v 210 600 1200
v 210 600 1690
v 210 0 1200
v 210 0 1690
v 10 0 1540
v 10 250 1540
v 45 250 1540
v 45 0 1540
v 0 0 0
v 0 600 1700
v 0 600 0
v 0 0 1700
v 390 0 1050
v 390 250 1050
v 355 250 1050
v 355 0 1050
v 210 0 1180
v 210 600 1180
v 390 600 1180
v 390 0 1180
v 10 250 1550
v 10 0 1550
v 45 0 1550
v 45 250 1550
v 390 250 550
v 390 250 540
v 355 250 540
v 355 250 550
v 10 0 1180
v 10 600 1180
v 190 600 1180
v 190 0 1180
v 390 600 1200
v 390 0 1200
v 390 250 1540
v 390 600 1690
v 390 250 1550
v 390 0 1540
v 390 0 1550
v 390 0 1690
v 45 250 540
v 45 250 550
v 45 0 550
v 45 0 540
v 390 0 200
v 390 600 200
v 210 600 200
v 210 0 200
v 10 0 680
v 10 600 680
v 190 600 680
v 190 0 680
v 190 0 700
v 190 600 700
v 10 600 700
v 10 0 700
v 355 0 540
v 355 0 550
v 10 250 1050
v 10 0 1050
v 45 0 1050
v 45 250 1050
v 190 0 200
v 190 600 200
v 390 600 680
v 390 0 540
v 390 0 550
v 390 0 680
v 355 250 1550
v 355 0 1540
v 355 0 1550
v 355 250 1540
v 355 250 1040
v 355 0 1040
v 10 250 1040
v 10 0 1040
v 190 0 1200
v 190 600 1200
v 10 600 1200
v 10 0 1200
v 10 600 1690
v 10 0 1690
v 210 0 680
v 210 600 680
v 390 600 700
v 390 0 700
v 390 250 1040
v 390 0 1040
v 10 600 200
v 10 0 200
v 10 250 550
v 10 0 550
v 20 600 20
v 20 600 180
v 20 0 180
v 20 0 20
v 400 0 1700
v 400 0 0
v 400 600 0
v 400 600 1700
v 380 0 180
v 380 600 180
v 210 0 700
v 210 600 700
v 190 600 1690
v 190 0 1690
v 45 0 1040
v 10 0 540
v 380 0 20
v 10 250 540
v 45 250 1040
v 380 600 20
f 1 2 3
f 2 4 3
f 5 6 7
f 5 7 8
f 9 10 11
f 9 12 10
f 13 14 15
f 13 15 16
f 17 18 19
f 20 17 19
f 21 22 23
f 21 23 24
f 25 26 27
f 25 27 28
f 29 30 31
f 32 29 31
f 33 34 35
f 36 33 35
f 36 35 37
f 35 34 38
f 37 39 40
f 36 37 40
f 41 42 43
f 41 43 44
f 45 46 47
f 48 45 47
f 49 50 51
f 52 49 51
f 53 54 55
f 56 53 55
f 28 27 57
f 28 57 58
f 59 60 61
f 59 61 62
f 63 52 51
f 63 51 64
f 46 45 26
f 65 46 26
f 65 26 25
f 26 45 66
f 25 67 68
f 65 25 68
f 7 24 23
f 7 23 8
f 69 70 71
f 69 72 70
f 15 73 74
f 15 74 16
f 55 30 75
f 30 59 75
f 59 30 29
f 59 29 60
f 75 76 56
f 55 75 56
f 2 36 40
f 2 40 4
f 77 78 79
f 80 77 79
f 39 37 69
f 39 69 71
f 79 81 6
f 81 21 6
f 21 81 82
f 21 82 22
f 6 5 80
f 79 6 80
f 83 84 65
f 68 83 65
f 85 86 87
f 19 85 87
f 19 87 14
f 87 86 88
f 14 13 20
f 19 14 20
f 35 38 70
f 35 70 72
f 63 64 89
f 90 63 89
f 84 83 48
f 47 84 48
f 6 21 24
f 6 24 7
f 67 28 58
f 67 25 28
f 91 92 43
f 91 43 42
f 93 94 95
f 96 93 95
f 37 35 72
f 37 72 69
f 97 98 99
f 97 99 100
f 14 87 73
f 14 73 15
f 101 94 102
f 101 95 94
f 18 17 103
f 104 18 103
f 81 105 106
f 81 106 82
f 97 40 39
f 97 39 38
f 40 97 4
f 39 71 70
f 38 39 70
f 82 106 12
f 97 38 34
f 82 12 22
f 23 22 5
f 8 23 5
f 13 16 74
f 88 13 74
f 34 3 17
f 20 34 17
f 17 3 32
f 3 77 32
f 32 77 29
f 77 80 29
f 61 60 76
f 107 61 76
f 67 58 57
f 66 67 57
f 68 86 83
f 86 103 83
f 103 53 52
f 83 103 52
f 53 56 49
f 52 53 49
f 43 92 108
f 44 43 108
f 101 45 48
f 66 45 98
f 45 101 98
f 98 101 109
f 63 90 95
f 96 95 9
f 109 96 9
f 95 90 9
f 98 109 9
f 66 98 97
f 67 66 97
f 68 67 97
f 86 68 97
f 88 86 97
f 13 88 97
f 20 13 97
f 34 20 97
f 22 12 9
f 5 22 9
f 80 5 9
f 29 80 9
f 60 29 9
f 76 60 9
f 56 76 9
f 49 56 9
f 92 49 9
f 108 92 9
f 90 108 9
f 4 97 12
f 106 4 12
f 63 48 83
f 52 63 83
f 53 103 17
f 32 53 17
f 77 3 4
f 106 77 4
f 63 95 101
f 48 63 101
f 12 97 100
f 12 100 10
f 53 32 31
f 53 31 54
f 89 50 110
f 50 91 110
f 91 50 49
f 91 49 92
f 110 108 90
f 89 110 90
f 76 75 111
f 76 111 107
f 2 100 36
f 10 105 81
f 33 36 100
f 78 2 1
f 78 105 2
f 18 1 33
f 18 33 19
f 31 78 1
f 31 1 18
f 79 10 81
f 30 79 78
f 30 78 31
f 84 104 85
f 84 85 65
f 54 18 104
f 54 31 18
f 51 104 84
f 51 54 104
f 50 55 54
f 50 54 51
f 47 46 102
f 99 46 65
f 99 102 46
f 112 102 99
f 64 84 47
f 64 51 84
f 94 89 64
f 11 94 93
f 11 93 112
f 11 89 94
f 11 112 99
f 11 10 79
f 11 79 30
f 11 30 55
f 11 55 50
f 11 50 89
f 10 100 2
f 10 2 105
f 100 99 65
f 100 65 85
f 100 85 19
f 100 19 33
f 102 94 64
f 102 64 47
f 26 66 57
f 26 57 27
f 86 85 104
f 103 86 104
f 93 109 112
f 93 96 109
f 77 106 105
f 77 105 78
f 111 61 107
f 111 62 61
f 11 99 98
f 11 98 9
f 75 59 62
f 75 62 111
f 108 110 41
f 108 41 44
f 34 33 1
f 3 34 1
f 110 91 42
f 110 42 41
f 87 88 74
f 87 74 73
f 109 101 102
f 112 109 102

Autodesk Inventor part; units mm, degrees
ref_plane "YZ Plane" through (0, 0, 0) normal (1, 0, 0) x (0, 1, 0)
ref_plane "XZ Plane" through (0, 0, 0) normal (0, 1, 0) x (-1, 0, 0)
ref_plane "XY Plane" through (0, 0, 0) normal (0, 0, 1) x (1, 0, 0)
sketch "Sketch2" plane through (0, 0, 0) normal (0, 1, 0) x (-1, 0, 0)
  line L0 (-400, 180) -> (-400, 1700)
  line L1 (-400, 1700) -> (0, 1700)
  line L2 (0, 1700) -> (0, 180)
  line L3 (-400, 200) -> (-400, 600)
  line L4 (0, 600) -> (0, 200)
  line L5 (0, 600) -> (0, 700)
  line L6 (-400, 700) -> (-400, 600)
  line L7 (-400, 700) -> (-400, 1100)
  line L8 (0, 1100) -> (0, 700)
  line L9 (0, 1100) -> (0, 1200)
  line L10 (-400, 1200) -> (-400, 1100)
  line L11 (-400, 1200) -> (-400, 1600)
  line L12 (0, 1600) -> (0, 1200)
  line L13 (0, 200) -> (0, 180)
  line L14 (0, 180) -> (-400, 180)
  line L15 (-400, 180) -> (-400, 200)
  line L16 (0, 700) -> (0, 680)
  line L17 (-400, 680) -> (-400, 700)
  line L18 (0, 1200) -> (0, 1180)
  line L19 (-400, 1180) -> (-400, 1200)
  line L20 (-390, 200) -> (-210, 200)
  line L21 (-190, 200) -> (-10, 200)
  line L22 (-10, 200) -> (-190, 200)
  line L23 (-210, 200) -> (-390, 200)
  line L24 (-210, 680) -> (-210, 200)
  line L25 (-190, 680) -> (-190, 200)
  line L26 (-390, 700) -> (-210, 700)
  line L27 (-190, 700) -> (-10, 700)
  line L28 (-10, 700) -> (-190, 700)
  line L29 (-210, 700) -> (-390, 700)
  line L30 (-10, 700) -> (-190, 700)
  line L31 (-210, 700) -> (-390, 700)
  line L32 (-10, 680) -> (-190, 680)
  line L33 (-210, 680) -> (-390, 680)
  line L34 (-10, 680) -> (-10, 200)
  line L35 (-390, 200) -> (-390, 680)
  line L36 (-210, 1690) -> (-210, 1200)
  line L37 (-210, 1180) -> (-210, 700)
  line L38 (-190, 1690) -> (-190, 1200)
  line L39 (-190, 1180) -> (-190, 700)
  line L40 (-390, 1200) -> (-210, 1200)
  line L41 (-190, 1200) -> (-10, 1200)
  line L42 (-10, 1200) -> (-190, 1200)
  line L43 (-210, 1200) -> (-390, 1200)
  line L44 (-10, 1200) -> (-190, 1200)
  line L45 (-210, 1200) -> (-390, 1200)
  line L46 (-10, 1180) -> (-190, 1180)
  line L47 (-210, 1180) -> (-390, 1180)
  line L48 (-10, 1690) -> (-10, 1200)
  line L49 (-10, 1180) -> (-10, 700)
  line L50 (-390, 700) -> (-390, 1180)
  line L51 (-390, 1200) -> (-390, 1690)
  line L52 (-390, 1690) -> (-210, 1690)
  line L53 (-190, 1690) -> (-10, 1690)
  point P0 (0, 0)
  dimension "d0" = 400
  dimension "d6" = 400
  dimension "d7" = 100
  dimension "d8" = 400
  dimension "d9" = 400
  dimension "d10" = 100
  dimension "d11" = 400
  dimension "d12" = 400
  dimension "d14" = 400
  dimension "d15" = 20
  dimension "d16" = 20
  dimension "d17" = 20
  dimension "d25" = 10
extrude "Extrusion1" add sketch "Sketch2" along normal blind 600
sketch "Sketch3" plane through (400, 0, 180) normal (0, 0, -1) x (-1, 0, 0)
  line L0 (0, 0) -> (400, 0)
  line L1 (400, 0) -> (400, 600)
  line L2 (400, 600) -> (0, 600)
  line L3 (0, 600) -> (0, 0)
  line L4 (20, 300) -> (380, 300)
  line L5 (200, 0) -> (200, 600)
  line L6 (0, 0) -> (20, 0)
  line L7 (20, 0) -> (20, 600)
  line L8 (20, 600) -> (0, 600)
  line L9 (0, 600) -> (0, 0)
  line L10 (400, 600) -> (380, 600)
  line L11 (380, 600) -> (380, 0)
  line L12 (380, 0) -> (400, 0)
  line L13 (400, 0) -> (400, 600)
  dimension "d20" = 20
  dimension "d21" = 20
extrude "Extrusion2" add sketch "Sketch3" along normal blind 200 contours L3 L2 L7 L0 | L11 L2 L1 L0
sketch "Sketch4" plane through (10, 0, 680) normal (1, 0, 0) x (0, 0, -1)
  line L0 (0, 0) -> (480, 0) projected
  line L1 (130, 0) -> (130, 250)
  line L2 (130, 0) -> (380, 0) construction
  line L3 (130, 250) -> (140, 250)
  line L4 (140, 250) -> (140, 0)
  line L5 (130, 0) -> (140, 0)
  point P0 (680, 0)
  dimension "d26" = 250
  dimension "d27" = 90
  dimension "d28" = 10
extrude "Extrusion3" add sketch "Sketch4" along normal blind 35
sketch "Sketch5" plane through (10, 0, 1180) normal (1, 0, 0) x (0, 0, -1)
  line L0 (0, 0) -> (480, 0) projected
  line L1 (130, 0) -> (130, 250)
  line L2 (130, 0) -> (380, 0) construction
  line L3 (130, 250) -> (140, 250)
  line L4 (140, 250) -> (140, 0)
  line L5 (140, 0) -> (130, 0)
  line L6 (-510, 0) -> (-20, 0) projected
  line L7 (-370, 0) -> (-370, 250)
  line L8 (-370, 0) -> (-120, 0) construction
  line L9 (-370, 250) -> (-360, 250)
  line L10 (-360, 250) -> (-360, 0)
  line L11 (-360, 0) -> (-370, 0)
  point P0 (1180, 0)
  point P1 (-360, 0)
  dimension "d31" = 250
  dimension "d32" = 90
  dimension "d33" = 10
  dimension "d34" = 250
  dimension "d35" = 90
  dimension "d36" = 10
  dimension "d37" = 90
  dimension "d38" = 90
extrude "Extrusion4" add sketch "Sketch5" along normal blind 35
sketch "Sketch7" plane through (20, 0, 180) normal (1, 0, 0) x (0, 0, -1)
  line L0 (-1520, 0) -> (200, 0) projected
  line L1 (200, 0) -> (160, 0)
  line L2 (160, 0) -> (160, 600)
  line L3 (160, 600) -> (200, 600)
  line L4 (200, 600) -> (200, 0)
  point P0 (180, 0)
  point P1 (160, 0)
  dimension "d49" = 40
  dimension "d50" = 600
extrude "Extrusion6" add sketch "Sketch7" along normal blind 370
sketch "Sketch8" plane through (390, 0, 200) normal (-1, 0, 0) x (0, 0, 1)
  line L0 (1500, 0) -> (-220, 0) projected
  line L1 (350, 0) -> (340, 0)
  line L2 (340, 0) -> (340, 250)
  line L3 (340, 250) -> (350, 250)
  line L4 (350, 250) -> (350, 0)
  line L5 (850, 0) -> (840, 0)
  line L6 (840, 0) -> (840, 250)
  line L7 (840, 250) -> (850, 250)
  line L8 (850, 250) -> (850, 0)
  line L9 (1350, 0) -> (1340, 0)
  line L10 (1340, 0) -> (1340, 250)
  line L11 (1340, 250) -> (1350, 250)
  line L12 (1350, 250) -> (1350, 0)
  point P0 (-200, 0)
  dimension "d53" = 10
  dimension "d54" = 250
  dimension "d55" = 10
  dimension "d56" = 250
  dimension "d57" = 10
  dimension "d58" = 250
extrude "Extrusion7" add sketch "Sketch8" along normal blind 35
sketch "Sketch9" plane through (400, 0, -20) normal (0, 0, -1) x (-1, 0, 0)
  line L0 (400, 600) -> (0, 600) projected
  line L1 (400, 600) -> (0, 600)
  line L2 (0, 600) -> (0, 0)
  line L3 (0, 0) -> (400, 0)
  line L4 (400, 0) -> (400, 600)
  point P0 (400, 0)
extrude "Extrusion8" cut sketch "Sketch9" against normal blind 20
properties part number "MoldsStore"
